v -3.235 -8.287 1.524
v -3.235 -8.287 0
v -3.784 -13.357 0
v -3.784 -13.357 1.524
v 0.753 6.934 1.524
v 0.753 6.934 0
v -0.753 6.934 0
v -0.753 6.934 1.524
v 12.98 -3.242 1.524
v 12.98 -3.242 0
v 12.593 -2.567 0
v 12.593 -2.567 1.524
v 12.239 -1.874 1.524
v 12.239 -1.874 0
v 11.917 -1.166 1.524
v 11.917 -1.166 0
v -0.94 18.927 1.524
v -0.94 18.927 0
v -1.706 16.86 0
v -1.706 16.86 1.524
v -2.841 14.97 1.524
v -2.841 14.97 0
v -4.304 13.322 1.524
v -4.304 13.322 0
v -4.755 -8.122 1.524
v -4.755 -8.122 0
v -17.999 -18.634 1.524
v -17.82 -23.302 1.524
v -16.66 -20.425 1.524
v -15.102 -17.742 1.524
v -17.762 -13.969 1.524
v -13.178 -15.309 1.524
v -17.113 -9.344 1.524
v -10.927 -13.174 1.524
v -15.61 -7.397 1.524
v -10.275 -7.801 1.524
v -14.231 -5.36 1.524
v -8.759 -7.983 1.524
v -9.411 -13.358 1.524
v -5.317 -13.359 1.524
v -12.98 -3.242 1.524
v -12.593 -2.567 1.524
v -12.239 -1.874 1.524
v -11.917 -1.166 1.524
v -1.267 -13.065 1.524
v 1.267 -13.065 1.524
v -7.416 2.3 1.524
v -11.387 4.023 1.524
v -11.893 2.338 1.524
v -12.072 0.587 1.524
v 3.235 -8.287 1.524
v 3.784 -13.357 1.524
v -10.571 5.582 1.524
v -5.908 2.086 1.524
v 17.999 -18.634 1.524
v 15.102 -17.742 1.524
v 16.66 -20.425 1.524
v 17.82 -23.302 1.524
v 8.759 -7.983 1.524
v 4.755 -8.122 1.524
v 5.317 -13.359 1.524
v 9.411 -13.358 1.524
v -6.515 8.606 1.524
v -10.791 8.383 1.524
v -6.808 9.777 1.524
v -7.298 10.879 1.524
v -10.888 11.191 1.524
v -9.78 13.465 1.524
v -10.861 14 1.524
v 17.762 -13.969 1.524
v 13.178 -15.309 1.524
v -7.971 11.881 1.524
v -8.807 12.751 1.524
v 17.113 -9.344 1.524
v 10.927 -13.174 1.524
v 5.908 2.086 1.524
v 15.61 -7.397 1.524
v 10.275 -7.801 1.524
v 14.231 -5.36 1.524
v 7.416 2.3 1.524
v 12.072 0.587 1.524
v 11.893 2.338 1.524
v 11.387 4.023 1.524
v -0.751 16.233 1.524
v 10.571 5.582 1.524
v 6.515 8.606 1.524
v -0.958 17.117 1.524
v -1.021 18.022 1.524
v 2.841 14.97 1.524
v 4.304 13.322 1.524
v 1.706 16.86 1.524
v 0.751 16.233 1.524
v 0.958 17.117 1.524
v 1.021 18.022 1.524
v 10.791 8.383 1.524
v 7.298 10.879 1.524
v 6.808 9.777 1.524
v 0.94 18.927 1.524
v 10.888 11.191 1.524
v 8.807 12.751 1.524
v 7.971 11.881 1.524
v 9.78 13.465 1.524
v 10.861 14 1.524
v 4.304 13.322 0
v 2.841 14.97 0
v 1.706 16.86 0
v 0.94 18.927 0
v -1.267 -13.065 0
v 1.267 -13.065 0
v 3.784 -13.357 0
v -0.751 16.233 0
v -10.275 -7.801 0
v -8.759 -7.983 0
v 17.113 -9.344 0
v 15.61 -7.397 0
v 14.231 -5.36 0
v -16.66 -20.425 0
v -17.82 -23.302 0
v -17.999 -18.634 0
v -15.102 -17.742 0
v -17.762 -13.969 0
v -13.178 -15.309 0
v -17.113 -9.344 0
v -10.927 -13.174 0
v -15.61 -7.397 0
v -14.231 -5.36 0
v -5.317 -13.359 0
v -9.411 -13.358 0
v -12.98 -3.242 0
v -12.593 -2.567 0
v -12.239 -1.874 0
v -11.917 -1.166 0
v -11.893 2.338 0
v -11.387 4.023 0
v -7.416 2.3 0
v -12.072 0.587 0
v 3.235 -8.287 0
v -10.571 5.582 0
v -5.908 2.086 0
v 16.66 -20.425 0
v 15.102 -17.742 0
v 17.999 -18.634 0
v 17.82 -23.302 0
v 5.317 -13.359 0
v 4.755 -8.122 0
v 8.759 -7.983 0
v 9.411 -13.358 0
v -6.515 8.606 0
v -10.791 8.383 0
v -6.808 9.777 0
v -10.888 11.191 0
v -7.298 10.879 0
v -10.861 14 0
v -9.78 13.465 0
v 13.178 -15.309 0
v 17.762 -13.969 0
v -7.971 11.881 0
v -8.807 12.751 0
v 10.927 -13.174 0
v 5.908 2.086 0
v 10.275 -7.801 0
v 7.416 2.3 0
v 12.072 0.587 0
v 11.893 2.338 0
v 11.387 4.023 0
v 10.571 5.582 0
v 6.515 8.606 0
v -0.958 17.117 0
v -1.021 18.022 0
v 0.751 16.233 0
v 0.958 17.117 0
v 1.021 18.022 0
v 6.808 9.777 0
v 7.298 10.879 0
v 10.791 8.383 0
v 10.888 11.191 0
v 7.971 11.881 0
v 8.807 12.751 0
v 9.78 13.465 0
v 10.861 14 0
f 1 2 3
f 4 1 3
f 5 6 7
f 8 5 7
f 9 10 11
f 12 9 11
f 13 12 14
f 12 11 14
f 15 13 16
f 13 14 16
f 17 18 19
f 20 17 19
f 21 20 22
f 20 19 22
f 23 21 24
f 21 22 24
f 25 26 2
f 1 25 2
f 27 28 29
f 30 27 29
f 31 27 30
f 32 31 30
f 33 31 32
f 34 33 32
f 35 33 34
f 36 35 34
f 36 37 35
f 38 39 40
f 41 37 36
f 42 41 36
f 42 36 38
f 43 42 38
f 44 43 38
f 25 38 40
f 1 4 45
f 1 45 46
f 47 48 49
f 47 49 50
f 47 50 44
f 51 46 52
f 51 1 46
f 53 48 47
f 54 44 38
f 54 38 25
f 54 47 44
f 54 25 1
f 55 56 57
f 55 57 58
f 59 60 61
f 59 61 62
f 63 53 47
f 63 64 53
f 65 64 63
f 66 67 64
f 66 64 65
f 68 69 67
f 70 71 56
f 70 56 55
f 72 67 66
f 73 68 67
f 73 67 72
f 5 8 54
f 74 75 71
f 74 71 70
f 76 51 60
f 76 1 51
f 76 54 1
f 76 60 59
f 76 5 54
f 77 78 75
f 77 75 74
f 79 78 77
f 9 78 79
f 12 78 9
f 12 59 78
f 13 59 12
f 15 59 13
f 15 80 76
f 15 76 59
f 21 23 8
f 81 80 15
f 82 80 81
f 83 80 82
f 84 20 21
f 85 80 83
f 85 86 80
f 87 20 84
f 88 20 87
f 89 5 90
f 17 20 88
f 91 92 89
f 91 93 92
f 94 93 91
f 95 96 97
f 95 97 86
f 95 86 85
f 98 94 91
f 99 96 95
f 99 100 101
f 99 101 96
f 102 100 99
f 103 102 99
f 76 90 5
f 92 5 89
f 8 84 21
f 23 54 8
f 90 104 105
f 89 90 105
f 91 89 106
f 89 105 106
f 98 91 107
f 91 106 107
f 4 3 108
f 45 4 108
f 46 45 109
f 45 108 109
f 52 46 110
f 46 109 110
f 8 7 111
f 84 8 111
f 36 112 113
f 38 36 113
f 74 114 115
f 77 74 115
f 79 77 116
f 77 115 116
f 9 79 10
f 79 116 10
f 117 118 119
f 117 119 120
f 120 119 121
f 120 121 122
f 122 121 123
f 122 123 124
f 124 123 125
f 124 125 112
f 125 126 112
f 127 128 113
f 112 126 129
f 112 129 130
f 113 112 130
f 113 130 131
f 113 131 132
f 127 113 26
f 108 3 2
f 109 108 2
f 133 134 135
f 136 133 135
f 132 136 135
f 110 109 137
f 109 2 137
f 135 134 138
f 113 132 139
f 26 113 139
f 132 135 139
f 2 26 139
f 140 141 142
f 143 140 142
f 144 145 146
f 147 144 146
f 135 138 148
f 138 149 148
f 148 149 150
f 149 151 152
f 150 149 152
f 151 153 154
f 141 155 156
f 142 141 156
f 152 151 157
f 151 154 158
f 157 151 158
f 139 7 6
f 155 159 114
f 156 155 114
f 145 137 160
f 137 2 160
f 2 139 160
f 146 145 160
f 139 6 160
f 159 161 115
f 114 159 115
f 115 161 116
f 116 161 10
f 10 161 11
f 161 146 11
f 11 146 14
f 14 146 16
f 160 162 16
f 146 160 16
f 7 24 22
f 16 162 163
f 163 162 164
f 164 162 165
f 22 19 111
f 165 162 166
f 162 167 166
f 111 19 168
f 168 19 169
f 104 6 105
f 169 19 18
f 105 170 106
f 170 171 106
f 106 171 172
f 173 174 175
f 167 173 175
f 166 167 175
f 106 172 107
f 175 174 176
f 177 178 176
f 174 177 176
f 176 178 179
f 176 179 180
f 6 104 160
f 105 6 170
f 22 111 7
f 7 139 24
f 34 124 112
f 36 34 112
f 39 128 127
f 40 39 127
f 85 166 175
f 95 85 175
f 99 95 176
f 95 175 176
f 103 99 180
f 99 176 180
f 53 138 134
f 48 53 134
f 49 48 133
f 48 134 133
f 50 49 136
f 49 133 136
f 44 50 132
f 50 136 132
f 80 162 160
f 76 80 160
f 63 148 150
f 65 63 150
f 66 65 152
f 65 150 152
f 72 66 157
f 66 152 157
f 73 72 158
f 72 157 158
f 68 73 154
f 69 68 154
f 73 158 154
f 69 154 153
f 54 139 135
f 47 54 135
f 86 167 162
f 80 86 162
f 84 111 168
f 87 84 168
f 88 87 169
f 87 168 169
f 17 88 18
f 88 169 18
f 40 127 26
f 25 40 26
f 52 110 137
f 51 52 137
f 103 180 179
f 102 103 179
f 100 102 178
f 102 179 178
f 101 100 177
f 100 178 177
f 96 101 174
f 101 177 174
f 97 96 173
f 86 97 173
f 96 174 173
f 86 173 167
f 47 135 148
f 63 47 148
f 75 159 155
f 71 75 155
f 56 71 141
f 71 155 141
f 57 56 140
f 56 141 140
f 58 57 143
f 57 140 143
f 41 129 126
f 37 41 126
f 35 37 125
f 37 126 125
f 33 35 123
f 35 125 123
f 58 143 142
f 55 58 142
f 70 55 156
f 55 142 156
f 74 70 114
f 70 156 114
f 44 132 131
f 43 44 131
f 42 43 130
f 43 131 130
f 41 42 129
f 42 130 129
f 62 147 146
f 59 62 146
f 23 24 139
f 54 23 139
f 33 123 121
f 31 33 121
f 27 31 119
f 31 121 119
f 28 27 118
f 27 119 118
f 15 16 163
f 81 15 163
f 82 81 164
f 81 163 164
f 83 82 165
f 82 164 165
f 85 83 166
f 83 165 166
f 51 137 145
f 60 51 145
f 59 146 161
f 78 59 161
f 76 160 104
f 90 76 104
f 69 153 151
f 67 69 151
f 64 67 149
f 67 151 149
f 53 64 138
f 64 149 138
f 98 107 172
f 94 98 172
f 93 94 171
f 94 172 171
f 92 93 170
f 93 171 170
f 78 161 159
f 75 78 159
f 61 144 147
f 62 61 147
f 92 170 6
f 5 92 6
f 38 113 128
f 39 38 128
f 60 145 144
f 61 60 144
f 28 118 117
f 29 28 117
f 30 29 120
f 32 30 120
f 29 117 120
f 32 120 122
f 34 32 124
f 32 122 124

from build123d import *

# Parameters (mm, degrees)
BOSS_EXTRUDE1_DEPTH = 1.524


with BuildPart() as part:
    # Sketch1 → Boss-Extrude1 (new body)
    with BuildSketch(Plane.XY):
        with BuildLine():
            Line((-3.235155639, -8.287391484), (-3.783555133, -13.357106433))
            ThreePointArc((-3.783555133, -13.357106433), (0, -13.028347252), (3.783555133, -13.357106433))
            Line((3.783555133, -13.357106433), (3.235155639, -8.287391484))
            Line((3.235155639, -8.287391484), (4.755175848, -8.122474118))
            Line((4.755175848, -8.122474118), (5.317484152, -13.35909326))
            Line((5.317484152, -13.35909326), (9.410610808, -13.358099847))
            Line((9.410610808, -13.358099847), (8.758889671, -7.983387544))
            Line((8.758889671, -7.983387544), (10.274936224, -7.800587713))
            Line((10.274936224, -7.800587713), (10.926657362, -13.174306602))
            ThreePointArc((10.926657362, -13.174306602), (15.10168665, -17.742358652), (17.820275176, -23.301787175))
            ThreePointArc((17.820275176, -23.301787175), (17.932389495, -16.299261358), (17.11310908, -9.343924052))
            ThreePointArc((17.11310908, -9.343924052), (14.904545185, -6.389006387), (12.979613066, -3.241955511))
            ThreePointArc((12.979613066, -3.241955511), (12.412109671, -2.2224752), (11.916873155, -1.165999455))
            ThreePointArc((11.916873155, -1.165999455), (11.893308886, 2.337529648), (10.570541154, 5.581841128))
            ThreePointArc((10.570541154, 5.581841128), (10.855213093, 9.786127154), (10.861185965, 14.000035485))
            ThreePointArc((10.861185965, 14.000035485), (7.971038383, 11.880829677), (6.515279188, 8.605963044))
            Line((6.515279188, 8.605963044), (7.415708302, 2.300096505))
            Line((7.415708302, 2.300096505), (5.907609567, 2.085505398))
            Line((5.907609567, 2.085505398), (4.304137007, 13.321734283))
            ThreePointArc((4.304137007, 13.321734283), (2.229613922, 15.888650106), (0.940042002, 18.926693413))
            ThreePointArc((0.940042002, 18.926693413), (1.007296175, 17.568367421), (0.751408616, 16.232667535))
            Line((0.751408616, 16.232667535), (0.753449362, 6.933674836))
            Line((0.753449362, 6.933674836), (-0.753449362, 6.933674836))
            Line((-0.753449362, 6.933674836), (-0.751408616, 16.232667535))
            ThreePointArc((-0.751408616, 16.232667535), (-1.007296175, 17.568367421), (-0.940042002, 18.926693413))
            ThreePointArc((-0.940042002, 18.926693413), (-2.229613922, 15.888650106), (-4.304137007, 13.321734283))
            Line((-4.304137007, 13.321734283), (-5.907609567, 2.085505398))
            Line((-5.907609567, 2.085505398), (-7.415708302, 2.300096505))
            Line((-7.415708302, 2.300096505), (-6.515279188, 8.605963044))
            ThreePointArc((-6.515279188, 8.605963044), (-7.971038383, 11.880829677), (-10.861185965, 14.000035485))
            ThreePointArc((-10.861185965, 14.000035485), (-10.855213093, 9.786127154), (-10.570541154, 5.581841128))
            ThreePointArc((-10.570541154, 5.581841128), (-11.893308886, 2.337529648), (-11.916873155, -1.165999455))
            ThreePointArc((-11.916873155, -1.165999455), (-12.412109671, -2.2224752), (-12.979613066, -3.241955511))
            ThreePointArc((-12.979613066, -3.241955511), (-14.904545185, -6.389006387), (-17.11310908, -9.343924052))
            ThreePointArc((-17.11310908, -9.343924052), (-17.932389495, -16.299261358), (-17.820275176, -23.301787175))
            ThreePointArc((-17.820275176, -23.301787175), (-15.10168665, -17.742358652), (-10.926657362, -13.174306602))
            Line((-10.926657362, -13.174306602), (-10.274936224, -7.800587713))
            Line((-10.274936224, -7.800587713), (-8.758889671, -7.983387544))
            Line((-8.758889671, -7.983387544), (-9.410610808, -13.358099847))
            Line((-9.410610808, -13.358099847), (-5.317484152, -13.35909326))
            Line((-5.317484152, -13.35909326), (-4.755175848, -8.122474118))
            Line((-4.755175848, -8.122474118), (-3.235155639, -8.287391484))
        make_face()
    extrude(amount=BOSS_EXTRUDE1_DEPTH)


solid = part.part
